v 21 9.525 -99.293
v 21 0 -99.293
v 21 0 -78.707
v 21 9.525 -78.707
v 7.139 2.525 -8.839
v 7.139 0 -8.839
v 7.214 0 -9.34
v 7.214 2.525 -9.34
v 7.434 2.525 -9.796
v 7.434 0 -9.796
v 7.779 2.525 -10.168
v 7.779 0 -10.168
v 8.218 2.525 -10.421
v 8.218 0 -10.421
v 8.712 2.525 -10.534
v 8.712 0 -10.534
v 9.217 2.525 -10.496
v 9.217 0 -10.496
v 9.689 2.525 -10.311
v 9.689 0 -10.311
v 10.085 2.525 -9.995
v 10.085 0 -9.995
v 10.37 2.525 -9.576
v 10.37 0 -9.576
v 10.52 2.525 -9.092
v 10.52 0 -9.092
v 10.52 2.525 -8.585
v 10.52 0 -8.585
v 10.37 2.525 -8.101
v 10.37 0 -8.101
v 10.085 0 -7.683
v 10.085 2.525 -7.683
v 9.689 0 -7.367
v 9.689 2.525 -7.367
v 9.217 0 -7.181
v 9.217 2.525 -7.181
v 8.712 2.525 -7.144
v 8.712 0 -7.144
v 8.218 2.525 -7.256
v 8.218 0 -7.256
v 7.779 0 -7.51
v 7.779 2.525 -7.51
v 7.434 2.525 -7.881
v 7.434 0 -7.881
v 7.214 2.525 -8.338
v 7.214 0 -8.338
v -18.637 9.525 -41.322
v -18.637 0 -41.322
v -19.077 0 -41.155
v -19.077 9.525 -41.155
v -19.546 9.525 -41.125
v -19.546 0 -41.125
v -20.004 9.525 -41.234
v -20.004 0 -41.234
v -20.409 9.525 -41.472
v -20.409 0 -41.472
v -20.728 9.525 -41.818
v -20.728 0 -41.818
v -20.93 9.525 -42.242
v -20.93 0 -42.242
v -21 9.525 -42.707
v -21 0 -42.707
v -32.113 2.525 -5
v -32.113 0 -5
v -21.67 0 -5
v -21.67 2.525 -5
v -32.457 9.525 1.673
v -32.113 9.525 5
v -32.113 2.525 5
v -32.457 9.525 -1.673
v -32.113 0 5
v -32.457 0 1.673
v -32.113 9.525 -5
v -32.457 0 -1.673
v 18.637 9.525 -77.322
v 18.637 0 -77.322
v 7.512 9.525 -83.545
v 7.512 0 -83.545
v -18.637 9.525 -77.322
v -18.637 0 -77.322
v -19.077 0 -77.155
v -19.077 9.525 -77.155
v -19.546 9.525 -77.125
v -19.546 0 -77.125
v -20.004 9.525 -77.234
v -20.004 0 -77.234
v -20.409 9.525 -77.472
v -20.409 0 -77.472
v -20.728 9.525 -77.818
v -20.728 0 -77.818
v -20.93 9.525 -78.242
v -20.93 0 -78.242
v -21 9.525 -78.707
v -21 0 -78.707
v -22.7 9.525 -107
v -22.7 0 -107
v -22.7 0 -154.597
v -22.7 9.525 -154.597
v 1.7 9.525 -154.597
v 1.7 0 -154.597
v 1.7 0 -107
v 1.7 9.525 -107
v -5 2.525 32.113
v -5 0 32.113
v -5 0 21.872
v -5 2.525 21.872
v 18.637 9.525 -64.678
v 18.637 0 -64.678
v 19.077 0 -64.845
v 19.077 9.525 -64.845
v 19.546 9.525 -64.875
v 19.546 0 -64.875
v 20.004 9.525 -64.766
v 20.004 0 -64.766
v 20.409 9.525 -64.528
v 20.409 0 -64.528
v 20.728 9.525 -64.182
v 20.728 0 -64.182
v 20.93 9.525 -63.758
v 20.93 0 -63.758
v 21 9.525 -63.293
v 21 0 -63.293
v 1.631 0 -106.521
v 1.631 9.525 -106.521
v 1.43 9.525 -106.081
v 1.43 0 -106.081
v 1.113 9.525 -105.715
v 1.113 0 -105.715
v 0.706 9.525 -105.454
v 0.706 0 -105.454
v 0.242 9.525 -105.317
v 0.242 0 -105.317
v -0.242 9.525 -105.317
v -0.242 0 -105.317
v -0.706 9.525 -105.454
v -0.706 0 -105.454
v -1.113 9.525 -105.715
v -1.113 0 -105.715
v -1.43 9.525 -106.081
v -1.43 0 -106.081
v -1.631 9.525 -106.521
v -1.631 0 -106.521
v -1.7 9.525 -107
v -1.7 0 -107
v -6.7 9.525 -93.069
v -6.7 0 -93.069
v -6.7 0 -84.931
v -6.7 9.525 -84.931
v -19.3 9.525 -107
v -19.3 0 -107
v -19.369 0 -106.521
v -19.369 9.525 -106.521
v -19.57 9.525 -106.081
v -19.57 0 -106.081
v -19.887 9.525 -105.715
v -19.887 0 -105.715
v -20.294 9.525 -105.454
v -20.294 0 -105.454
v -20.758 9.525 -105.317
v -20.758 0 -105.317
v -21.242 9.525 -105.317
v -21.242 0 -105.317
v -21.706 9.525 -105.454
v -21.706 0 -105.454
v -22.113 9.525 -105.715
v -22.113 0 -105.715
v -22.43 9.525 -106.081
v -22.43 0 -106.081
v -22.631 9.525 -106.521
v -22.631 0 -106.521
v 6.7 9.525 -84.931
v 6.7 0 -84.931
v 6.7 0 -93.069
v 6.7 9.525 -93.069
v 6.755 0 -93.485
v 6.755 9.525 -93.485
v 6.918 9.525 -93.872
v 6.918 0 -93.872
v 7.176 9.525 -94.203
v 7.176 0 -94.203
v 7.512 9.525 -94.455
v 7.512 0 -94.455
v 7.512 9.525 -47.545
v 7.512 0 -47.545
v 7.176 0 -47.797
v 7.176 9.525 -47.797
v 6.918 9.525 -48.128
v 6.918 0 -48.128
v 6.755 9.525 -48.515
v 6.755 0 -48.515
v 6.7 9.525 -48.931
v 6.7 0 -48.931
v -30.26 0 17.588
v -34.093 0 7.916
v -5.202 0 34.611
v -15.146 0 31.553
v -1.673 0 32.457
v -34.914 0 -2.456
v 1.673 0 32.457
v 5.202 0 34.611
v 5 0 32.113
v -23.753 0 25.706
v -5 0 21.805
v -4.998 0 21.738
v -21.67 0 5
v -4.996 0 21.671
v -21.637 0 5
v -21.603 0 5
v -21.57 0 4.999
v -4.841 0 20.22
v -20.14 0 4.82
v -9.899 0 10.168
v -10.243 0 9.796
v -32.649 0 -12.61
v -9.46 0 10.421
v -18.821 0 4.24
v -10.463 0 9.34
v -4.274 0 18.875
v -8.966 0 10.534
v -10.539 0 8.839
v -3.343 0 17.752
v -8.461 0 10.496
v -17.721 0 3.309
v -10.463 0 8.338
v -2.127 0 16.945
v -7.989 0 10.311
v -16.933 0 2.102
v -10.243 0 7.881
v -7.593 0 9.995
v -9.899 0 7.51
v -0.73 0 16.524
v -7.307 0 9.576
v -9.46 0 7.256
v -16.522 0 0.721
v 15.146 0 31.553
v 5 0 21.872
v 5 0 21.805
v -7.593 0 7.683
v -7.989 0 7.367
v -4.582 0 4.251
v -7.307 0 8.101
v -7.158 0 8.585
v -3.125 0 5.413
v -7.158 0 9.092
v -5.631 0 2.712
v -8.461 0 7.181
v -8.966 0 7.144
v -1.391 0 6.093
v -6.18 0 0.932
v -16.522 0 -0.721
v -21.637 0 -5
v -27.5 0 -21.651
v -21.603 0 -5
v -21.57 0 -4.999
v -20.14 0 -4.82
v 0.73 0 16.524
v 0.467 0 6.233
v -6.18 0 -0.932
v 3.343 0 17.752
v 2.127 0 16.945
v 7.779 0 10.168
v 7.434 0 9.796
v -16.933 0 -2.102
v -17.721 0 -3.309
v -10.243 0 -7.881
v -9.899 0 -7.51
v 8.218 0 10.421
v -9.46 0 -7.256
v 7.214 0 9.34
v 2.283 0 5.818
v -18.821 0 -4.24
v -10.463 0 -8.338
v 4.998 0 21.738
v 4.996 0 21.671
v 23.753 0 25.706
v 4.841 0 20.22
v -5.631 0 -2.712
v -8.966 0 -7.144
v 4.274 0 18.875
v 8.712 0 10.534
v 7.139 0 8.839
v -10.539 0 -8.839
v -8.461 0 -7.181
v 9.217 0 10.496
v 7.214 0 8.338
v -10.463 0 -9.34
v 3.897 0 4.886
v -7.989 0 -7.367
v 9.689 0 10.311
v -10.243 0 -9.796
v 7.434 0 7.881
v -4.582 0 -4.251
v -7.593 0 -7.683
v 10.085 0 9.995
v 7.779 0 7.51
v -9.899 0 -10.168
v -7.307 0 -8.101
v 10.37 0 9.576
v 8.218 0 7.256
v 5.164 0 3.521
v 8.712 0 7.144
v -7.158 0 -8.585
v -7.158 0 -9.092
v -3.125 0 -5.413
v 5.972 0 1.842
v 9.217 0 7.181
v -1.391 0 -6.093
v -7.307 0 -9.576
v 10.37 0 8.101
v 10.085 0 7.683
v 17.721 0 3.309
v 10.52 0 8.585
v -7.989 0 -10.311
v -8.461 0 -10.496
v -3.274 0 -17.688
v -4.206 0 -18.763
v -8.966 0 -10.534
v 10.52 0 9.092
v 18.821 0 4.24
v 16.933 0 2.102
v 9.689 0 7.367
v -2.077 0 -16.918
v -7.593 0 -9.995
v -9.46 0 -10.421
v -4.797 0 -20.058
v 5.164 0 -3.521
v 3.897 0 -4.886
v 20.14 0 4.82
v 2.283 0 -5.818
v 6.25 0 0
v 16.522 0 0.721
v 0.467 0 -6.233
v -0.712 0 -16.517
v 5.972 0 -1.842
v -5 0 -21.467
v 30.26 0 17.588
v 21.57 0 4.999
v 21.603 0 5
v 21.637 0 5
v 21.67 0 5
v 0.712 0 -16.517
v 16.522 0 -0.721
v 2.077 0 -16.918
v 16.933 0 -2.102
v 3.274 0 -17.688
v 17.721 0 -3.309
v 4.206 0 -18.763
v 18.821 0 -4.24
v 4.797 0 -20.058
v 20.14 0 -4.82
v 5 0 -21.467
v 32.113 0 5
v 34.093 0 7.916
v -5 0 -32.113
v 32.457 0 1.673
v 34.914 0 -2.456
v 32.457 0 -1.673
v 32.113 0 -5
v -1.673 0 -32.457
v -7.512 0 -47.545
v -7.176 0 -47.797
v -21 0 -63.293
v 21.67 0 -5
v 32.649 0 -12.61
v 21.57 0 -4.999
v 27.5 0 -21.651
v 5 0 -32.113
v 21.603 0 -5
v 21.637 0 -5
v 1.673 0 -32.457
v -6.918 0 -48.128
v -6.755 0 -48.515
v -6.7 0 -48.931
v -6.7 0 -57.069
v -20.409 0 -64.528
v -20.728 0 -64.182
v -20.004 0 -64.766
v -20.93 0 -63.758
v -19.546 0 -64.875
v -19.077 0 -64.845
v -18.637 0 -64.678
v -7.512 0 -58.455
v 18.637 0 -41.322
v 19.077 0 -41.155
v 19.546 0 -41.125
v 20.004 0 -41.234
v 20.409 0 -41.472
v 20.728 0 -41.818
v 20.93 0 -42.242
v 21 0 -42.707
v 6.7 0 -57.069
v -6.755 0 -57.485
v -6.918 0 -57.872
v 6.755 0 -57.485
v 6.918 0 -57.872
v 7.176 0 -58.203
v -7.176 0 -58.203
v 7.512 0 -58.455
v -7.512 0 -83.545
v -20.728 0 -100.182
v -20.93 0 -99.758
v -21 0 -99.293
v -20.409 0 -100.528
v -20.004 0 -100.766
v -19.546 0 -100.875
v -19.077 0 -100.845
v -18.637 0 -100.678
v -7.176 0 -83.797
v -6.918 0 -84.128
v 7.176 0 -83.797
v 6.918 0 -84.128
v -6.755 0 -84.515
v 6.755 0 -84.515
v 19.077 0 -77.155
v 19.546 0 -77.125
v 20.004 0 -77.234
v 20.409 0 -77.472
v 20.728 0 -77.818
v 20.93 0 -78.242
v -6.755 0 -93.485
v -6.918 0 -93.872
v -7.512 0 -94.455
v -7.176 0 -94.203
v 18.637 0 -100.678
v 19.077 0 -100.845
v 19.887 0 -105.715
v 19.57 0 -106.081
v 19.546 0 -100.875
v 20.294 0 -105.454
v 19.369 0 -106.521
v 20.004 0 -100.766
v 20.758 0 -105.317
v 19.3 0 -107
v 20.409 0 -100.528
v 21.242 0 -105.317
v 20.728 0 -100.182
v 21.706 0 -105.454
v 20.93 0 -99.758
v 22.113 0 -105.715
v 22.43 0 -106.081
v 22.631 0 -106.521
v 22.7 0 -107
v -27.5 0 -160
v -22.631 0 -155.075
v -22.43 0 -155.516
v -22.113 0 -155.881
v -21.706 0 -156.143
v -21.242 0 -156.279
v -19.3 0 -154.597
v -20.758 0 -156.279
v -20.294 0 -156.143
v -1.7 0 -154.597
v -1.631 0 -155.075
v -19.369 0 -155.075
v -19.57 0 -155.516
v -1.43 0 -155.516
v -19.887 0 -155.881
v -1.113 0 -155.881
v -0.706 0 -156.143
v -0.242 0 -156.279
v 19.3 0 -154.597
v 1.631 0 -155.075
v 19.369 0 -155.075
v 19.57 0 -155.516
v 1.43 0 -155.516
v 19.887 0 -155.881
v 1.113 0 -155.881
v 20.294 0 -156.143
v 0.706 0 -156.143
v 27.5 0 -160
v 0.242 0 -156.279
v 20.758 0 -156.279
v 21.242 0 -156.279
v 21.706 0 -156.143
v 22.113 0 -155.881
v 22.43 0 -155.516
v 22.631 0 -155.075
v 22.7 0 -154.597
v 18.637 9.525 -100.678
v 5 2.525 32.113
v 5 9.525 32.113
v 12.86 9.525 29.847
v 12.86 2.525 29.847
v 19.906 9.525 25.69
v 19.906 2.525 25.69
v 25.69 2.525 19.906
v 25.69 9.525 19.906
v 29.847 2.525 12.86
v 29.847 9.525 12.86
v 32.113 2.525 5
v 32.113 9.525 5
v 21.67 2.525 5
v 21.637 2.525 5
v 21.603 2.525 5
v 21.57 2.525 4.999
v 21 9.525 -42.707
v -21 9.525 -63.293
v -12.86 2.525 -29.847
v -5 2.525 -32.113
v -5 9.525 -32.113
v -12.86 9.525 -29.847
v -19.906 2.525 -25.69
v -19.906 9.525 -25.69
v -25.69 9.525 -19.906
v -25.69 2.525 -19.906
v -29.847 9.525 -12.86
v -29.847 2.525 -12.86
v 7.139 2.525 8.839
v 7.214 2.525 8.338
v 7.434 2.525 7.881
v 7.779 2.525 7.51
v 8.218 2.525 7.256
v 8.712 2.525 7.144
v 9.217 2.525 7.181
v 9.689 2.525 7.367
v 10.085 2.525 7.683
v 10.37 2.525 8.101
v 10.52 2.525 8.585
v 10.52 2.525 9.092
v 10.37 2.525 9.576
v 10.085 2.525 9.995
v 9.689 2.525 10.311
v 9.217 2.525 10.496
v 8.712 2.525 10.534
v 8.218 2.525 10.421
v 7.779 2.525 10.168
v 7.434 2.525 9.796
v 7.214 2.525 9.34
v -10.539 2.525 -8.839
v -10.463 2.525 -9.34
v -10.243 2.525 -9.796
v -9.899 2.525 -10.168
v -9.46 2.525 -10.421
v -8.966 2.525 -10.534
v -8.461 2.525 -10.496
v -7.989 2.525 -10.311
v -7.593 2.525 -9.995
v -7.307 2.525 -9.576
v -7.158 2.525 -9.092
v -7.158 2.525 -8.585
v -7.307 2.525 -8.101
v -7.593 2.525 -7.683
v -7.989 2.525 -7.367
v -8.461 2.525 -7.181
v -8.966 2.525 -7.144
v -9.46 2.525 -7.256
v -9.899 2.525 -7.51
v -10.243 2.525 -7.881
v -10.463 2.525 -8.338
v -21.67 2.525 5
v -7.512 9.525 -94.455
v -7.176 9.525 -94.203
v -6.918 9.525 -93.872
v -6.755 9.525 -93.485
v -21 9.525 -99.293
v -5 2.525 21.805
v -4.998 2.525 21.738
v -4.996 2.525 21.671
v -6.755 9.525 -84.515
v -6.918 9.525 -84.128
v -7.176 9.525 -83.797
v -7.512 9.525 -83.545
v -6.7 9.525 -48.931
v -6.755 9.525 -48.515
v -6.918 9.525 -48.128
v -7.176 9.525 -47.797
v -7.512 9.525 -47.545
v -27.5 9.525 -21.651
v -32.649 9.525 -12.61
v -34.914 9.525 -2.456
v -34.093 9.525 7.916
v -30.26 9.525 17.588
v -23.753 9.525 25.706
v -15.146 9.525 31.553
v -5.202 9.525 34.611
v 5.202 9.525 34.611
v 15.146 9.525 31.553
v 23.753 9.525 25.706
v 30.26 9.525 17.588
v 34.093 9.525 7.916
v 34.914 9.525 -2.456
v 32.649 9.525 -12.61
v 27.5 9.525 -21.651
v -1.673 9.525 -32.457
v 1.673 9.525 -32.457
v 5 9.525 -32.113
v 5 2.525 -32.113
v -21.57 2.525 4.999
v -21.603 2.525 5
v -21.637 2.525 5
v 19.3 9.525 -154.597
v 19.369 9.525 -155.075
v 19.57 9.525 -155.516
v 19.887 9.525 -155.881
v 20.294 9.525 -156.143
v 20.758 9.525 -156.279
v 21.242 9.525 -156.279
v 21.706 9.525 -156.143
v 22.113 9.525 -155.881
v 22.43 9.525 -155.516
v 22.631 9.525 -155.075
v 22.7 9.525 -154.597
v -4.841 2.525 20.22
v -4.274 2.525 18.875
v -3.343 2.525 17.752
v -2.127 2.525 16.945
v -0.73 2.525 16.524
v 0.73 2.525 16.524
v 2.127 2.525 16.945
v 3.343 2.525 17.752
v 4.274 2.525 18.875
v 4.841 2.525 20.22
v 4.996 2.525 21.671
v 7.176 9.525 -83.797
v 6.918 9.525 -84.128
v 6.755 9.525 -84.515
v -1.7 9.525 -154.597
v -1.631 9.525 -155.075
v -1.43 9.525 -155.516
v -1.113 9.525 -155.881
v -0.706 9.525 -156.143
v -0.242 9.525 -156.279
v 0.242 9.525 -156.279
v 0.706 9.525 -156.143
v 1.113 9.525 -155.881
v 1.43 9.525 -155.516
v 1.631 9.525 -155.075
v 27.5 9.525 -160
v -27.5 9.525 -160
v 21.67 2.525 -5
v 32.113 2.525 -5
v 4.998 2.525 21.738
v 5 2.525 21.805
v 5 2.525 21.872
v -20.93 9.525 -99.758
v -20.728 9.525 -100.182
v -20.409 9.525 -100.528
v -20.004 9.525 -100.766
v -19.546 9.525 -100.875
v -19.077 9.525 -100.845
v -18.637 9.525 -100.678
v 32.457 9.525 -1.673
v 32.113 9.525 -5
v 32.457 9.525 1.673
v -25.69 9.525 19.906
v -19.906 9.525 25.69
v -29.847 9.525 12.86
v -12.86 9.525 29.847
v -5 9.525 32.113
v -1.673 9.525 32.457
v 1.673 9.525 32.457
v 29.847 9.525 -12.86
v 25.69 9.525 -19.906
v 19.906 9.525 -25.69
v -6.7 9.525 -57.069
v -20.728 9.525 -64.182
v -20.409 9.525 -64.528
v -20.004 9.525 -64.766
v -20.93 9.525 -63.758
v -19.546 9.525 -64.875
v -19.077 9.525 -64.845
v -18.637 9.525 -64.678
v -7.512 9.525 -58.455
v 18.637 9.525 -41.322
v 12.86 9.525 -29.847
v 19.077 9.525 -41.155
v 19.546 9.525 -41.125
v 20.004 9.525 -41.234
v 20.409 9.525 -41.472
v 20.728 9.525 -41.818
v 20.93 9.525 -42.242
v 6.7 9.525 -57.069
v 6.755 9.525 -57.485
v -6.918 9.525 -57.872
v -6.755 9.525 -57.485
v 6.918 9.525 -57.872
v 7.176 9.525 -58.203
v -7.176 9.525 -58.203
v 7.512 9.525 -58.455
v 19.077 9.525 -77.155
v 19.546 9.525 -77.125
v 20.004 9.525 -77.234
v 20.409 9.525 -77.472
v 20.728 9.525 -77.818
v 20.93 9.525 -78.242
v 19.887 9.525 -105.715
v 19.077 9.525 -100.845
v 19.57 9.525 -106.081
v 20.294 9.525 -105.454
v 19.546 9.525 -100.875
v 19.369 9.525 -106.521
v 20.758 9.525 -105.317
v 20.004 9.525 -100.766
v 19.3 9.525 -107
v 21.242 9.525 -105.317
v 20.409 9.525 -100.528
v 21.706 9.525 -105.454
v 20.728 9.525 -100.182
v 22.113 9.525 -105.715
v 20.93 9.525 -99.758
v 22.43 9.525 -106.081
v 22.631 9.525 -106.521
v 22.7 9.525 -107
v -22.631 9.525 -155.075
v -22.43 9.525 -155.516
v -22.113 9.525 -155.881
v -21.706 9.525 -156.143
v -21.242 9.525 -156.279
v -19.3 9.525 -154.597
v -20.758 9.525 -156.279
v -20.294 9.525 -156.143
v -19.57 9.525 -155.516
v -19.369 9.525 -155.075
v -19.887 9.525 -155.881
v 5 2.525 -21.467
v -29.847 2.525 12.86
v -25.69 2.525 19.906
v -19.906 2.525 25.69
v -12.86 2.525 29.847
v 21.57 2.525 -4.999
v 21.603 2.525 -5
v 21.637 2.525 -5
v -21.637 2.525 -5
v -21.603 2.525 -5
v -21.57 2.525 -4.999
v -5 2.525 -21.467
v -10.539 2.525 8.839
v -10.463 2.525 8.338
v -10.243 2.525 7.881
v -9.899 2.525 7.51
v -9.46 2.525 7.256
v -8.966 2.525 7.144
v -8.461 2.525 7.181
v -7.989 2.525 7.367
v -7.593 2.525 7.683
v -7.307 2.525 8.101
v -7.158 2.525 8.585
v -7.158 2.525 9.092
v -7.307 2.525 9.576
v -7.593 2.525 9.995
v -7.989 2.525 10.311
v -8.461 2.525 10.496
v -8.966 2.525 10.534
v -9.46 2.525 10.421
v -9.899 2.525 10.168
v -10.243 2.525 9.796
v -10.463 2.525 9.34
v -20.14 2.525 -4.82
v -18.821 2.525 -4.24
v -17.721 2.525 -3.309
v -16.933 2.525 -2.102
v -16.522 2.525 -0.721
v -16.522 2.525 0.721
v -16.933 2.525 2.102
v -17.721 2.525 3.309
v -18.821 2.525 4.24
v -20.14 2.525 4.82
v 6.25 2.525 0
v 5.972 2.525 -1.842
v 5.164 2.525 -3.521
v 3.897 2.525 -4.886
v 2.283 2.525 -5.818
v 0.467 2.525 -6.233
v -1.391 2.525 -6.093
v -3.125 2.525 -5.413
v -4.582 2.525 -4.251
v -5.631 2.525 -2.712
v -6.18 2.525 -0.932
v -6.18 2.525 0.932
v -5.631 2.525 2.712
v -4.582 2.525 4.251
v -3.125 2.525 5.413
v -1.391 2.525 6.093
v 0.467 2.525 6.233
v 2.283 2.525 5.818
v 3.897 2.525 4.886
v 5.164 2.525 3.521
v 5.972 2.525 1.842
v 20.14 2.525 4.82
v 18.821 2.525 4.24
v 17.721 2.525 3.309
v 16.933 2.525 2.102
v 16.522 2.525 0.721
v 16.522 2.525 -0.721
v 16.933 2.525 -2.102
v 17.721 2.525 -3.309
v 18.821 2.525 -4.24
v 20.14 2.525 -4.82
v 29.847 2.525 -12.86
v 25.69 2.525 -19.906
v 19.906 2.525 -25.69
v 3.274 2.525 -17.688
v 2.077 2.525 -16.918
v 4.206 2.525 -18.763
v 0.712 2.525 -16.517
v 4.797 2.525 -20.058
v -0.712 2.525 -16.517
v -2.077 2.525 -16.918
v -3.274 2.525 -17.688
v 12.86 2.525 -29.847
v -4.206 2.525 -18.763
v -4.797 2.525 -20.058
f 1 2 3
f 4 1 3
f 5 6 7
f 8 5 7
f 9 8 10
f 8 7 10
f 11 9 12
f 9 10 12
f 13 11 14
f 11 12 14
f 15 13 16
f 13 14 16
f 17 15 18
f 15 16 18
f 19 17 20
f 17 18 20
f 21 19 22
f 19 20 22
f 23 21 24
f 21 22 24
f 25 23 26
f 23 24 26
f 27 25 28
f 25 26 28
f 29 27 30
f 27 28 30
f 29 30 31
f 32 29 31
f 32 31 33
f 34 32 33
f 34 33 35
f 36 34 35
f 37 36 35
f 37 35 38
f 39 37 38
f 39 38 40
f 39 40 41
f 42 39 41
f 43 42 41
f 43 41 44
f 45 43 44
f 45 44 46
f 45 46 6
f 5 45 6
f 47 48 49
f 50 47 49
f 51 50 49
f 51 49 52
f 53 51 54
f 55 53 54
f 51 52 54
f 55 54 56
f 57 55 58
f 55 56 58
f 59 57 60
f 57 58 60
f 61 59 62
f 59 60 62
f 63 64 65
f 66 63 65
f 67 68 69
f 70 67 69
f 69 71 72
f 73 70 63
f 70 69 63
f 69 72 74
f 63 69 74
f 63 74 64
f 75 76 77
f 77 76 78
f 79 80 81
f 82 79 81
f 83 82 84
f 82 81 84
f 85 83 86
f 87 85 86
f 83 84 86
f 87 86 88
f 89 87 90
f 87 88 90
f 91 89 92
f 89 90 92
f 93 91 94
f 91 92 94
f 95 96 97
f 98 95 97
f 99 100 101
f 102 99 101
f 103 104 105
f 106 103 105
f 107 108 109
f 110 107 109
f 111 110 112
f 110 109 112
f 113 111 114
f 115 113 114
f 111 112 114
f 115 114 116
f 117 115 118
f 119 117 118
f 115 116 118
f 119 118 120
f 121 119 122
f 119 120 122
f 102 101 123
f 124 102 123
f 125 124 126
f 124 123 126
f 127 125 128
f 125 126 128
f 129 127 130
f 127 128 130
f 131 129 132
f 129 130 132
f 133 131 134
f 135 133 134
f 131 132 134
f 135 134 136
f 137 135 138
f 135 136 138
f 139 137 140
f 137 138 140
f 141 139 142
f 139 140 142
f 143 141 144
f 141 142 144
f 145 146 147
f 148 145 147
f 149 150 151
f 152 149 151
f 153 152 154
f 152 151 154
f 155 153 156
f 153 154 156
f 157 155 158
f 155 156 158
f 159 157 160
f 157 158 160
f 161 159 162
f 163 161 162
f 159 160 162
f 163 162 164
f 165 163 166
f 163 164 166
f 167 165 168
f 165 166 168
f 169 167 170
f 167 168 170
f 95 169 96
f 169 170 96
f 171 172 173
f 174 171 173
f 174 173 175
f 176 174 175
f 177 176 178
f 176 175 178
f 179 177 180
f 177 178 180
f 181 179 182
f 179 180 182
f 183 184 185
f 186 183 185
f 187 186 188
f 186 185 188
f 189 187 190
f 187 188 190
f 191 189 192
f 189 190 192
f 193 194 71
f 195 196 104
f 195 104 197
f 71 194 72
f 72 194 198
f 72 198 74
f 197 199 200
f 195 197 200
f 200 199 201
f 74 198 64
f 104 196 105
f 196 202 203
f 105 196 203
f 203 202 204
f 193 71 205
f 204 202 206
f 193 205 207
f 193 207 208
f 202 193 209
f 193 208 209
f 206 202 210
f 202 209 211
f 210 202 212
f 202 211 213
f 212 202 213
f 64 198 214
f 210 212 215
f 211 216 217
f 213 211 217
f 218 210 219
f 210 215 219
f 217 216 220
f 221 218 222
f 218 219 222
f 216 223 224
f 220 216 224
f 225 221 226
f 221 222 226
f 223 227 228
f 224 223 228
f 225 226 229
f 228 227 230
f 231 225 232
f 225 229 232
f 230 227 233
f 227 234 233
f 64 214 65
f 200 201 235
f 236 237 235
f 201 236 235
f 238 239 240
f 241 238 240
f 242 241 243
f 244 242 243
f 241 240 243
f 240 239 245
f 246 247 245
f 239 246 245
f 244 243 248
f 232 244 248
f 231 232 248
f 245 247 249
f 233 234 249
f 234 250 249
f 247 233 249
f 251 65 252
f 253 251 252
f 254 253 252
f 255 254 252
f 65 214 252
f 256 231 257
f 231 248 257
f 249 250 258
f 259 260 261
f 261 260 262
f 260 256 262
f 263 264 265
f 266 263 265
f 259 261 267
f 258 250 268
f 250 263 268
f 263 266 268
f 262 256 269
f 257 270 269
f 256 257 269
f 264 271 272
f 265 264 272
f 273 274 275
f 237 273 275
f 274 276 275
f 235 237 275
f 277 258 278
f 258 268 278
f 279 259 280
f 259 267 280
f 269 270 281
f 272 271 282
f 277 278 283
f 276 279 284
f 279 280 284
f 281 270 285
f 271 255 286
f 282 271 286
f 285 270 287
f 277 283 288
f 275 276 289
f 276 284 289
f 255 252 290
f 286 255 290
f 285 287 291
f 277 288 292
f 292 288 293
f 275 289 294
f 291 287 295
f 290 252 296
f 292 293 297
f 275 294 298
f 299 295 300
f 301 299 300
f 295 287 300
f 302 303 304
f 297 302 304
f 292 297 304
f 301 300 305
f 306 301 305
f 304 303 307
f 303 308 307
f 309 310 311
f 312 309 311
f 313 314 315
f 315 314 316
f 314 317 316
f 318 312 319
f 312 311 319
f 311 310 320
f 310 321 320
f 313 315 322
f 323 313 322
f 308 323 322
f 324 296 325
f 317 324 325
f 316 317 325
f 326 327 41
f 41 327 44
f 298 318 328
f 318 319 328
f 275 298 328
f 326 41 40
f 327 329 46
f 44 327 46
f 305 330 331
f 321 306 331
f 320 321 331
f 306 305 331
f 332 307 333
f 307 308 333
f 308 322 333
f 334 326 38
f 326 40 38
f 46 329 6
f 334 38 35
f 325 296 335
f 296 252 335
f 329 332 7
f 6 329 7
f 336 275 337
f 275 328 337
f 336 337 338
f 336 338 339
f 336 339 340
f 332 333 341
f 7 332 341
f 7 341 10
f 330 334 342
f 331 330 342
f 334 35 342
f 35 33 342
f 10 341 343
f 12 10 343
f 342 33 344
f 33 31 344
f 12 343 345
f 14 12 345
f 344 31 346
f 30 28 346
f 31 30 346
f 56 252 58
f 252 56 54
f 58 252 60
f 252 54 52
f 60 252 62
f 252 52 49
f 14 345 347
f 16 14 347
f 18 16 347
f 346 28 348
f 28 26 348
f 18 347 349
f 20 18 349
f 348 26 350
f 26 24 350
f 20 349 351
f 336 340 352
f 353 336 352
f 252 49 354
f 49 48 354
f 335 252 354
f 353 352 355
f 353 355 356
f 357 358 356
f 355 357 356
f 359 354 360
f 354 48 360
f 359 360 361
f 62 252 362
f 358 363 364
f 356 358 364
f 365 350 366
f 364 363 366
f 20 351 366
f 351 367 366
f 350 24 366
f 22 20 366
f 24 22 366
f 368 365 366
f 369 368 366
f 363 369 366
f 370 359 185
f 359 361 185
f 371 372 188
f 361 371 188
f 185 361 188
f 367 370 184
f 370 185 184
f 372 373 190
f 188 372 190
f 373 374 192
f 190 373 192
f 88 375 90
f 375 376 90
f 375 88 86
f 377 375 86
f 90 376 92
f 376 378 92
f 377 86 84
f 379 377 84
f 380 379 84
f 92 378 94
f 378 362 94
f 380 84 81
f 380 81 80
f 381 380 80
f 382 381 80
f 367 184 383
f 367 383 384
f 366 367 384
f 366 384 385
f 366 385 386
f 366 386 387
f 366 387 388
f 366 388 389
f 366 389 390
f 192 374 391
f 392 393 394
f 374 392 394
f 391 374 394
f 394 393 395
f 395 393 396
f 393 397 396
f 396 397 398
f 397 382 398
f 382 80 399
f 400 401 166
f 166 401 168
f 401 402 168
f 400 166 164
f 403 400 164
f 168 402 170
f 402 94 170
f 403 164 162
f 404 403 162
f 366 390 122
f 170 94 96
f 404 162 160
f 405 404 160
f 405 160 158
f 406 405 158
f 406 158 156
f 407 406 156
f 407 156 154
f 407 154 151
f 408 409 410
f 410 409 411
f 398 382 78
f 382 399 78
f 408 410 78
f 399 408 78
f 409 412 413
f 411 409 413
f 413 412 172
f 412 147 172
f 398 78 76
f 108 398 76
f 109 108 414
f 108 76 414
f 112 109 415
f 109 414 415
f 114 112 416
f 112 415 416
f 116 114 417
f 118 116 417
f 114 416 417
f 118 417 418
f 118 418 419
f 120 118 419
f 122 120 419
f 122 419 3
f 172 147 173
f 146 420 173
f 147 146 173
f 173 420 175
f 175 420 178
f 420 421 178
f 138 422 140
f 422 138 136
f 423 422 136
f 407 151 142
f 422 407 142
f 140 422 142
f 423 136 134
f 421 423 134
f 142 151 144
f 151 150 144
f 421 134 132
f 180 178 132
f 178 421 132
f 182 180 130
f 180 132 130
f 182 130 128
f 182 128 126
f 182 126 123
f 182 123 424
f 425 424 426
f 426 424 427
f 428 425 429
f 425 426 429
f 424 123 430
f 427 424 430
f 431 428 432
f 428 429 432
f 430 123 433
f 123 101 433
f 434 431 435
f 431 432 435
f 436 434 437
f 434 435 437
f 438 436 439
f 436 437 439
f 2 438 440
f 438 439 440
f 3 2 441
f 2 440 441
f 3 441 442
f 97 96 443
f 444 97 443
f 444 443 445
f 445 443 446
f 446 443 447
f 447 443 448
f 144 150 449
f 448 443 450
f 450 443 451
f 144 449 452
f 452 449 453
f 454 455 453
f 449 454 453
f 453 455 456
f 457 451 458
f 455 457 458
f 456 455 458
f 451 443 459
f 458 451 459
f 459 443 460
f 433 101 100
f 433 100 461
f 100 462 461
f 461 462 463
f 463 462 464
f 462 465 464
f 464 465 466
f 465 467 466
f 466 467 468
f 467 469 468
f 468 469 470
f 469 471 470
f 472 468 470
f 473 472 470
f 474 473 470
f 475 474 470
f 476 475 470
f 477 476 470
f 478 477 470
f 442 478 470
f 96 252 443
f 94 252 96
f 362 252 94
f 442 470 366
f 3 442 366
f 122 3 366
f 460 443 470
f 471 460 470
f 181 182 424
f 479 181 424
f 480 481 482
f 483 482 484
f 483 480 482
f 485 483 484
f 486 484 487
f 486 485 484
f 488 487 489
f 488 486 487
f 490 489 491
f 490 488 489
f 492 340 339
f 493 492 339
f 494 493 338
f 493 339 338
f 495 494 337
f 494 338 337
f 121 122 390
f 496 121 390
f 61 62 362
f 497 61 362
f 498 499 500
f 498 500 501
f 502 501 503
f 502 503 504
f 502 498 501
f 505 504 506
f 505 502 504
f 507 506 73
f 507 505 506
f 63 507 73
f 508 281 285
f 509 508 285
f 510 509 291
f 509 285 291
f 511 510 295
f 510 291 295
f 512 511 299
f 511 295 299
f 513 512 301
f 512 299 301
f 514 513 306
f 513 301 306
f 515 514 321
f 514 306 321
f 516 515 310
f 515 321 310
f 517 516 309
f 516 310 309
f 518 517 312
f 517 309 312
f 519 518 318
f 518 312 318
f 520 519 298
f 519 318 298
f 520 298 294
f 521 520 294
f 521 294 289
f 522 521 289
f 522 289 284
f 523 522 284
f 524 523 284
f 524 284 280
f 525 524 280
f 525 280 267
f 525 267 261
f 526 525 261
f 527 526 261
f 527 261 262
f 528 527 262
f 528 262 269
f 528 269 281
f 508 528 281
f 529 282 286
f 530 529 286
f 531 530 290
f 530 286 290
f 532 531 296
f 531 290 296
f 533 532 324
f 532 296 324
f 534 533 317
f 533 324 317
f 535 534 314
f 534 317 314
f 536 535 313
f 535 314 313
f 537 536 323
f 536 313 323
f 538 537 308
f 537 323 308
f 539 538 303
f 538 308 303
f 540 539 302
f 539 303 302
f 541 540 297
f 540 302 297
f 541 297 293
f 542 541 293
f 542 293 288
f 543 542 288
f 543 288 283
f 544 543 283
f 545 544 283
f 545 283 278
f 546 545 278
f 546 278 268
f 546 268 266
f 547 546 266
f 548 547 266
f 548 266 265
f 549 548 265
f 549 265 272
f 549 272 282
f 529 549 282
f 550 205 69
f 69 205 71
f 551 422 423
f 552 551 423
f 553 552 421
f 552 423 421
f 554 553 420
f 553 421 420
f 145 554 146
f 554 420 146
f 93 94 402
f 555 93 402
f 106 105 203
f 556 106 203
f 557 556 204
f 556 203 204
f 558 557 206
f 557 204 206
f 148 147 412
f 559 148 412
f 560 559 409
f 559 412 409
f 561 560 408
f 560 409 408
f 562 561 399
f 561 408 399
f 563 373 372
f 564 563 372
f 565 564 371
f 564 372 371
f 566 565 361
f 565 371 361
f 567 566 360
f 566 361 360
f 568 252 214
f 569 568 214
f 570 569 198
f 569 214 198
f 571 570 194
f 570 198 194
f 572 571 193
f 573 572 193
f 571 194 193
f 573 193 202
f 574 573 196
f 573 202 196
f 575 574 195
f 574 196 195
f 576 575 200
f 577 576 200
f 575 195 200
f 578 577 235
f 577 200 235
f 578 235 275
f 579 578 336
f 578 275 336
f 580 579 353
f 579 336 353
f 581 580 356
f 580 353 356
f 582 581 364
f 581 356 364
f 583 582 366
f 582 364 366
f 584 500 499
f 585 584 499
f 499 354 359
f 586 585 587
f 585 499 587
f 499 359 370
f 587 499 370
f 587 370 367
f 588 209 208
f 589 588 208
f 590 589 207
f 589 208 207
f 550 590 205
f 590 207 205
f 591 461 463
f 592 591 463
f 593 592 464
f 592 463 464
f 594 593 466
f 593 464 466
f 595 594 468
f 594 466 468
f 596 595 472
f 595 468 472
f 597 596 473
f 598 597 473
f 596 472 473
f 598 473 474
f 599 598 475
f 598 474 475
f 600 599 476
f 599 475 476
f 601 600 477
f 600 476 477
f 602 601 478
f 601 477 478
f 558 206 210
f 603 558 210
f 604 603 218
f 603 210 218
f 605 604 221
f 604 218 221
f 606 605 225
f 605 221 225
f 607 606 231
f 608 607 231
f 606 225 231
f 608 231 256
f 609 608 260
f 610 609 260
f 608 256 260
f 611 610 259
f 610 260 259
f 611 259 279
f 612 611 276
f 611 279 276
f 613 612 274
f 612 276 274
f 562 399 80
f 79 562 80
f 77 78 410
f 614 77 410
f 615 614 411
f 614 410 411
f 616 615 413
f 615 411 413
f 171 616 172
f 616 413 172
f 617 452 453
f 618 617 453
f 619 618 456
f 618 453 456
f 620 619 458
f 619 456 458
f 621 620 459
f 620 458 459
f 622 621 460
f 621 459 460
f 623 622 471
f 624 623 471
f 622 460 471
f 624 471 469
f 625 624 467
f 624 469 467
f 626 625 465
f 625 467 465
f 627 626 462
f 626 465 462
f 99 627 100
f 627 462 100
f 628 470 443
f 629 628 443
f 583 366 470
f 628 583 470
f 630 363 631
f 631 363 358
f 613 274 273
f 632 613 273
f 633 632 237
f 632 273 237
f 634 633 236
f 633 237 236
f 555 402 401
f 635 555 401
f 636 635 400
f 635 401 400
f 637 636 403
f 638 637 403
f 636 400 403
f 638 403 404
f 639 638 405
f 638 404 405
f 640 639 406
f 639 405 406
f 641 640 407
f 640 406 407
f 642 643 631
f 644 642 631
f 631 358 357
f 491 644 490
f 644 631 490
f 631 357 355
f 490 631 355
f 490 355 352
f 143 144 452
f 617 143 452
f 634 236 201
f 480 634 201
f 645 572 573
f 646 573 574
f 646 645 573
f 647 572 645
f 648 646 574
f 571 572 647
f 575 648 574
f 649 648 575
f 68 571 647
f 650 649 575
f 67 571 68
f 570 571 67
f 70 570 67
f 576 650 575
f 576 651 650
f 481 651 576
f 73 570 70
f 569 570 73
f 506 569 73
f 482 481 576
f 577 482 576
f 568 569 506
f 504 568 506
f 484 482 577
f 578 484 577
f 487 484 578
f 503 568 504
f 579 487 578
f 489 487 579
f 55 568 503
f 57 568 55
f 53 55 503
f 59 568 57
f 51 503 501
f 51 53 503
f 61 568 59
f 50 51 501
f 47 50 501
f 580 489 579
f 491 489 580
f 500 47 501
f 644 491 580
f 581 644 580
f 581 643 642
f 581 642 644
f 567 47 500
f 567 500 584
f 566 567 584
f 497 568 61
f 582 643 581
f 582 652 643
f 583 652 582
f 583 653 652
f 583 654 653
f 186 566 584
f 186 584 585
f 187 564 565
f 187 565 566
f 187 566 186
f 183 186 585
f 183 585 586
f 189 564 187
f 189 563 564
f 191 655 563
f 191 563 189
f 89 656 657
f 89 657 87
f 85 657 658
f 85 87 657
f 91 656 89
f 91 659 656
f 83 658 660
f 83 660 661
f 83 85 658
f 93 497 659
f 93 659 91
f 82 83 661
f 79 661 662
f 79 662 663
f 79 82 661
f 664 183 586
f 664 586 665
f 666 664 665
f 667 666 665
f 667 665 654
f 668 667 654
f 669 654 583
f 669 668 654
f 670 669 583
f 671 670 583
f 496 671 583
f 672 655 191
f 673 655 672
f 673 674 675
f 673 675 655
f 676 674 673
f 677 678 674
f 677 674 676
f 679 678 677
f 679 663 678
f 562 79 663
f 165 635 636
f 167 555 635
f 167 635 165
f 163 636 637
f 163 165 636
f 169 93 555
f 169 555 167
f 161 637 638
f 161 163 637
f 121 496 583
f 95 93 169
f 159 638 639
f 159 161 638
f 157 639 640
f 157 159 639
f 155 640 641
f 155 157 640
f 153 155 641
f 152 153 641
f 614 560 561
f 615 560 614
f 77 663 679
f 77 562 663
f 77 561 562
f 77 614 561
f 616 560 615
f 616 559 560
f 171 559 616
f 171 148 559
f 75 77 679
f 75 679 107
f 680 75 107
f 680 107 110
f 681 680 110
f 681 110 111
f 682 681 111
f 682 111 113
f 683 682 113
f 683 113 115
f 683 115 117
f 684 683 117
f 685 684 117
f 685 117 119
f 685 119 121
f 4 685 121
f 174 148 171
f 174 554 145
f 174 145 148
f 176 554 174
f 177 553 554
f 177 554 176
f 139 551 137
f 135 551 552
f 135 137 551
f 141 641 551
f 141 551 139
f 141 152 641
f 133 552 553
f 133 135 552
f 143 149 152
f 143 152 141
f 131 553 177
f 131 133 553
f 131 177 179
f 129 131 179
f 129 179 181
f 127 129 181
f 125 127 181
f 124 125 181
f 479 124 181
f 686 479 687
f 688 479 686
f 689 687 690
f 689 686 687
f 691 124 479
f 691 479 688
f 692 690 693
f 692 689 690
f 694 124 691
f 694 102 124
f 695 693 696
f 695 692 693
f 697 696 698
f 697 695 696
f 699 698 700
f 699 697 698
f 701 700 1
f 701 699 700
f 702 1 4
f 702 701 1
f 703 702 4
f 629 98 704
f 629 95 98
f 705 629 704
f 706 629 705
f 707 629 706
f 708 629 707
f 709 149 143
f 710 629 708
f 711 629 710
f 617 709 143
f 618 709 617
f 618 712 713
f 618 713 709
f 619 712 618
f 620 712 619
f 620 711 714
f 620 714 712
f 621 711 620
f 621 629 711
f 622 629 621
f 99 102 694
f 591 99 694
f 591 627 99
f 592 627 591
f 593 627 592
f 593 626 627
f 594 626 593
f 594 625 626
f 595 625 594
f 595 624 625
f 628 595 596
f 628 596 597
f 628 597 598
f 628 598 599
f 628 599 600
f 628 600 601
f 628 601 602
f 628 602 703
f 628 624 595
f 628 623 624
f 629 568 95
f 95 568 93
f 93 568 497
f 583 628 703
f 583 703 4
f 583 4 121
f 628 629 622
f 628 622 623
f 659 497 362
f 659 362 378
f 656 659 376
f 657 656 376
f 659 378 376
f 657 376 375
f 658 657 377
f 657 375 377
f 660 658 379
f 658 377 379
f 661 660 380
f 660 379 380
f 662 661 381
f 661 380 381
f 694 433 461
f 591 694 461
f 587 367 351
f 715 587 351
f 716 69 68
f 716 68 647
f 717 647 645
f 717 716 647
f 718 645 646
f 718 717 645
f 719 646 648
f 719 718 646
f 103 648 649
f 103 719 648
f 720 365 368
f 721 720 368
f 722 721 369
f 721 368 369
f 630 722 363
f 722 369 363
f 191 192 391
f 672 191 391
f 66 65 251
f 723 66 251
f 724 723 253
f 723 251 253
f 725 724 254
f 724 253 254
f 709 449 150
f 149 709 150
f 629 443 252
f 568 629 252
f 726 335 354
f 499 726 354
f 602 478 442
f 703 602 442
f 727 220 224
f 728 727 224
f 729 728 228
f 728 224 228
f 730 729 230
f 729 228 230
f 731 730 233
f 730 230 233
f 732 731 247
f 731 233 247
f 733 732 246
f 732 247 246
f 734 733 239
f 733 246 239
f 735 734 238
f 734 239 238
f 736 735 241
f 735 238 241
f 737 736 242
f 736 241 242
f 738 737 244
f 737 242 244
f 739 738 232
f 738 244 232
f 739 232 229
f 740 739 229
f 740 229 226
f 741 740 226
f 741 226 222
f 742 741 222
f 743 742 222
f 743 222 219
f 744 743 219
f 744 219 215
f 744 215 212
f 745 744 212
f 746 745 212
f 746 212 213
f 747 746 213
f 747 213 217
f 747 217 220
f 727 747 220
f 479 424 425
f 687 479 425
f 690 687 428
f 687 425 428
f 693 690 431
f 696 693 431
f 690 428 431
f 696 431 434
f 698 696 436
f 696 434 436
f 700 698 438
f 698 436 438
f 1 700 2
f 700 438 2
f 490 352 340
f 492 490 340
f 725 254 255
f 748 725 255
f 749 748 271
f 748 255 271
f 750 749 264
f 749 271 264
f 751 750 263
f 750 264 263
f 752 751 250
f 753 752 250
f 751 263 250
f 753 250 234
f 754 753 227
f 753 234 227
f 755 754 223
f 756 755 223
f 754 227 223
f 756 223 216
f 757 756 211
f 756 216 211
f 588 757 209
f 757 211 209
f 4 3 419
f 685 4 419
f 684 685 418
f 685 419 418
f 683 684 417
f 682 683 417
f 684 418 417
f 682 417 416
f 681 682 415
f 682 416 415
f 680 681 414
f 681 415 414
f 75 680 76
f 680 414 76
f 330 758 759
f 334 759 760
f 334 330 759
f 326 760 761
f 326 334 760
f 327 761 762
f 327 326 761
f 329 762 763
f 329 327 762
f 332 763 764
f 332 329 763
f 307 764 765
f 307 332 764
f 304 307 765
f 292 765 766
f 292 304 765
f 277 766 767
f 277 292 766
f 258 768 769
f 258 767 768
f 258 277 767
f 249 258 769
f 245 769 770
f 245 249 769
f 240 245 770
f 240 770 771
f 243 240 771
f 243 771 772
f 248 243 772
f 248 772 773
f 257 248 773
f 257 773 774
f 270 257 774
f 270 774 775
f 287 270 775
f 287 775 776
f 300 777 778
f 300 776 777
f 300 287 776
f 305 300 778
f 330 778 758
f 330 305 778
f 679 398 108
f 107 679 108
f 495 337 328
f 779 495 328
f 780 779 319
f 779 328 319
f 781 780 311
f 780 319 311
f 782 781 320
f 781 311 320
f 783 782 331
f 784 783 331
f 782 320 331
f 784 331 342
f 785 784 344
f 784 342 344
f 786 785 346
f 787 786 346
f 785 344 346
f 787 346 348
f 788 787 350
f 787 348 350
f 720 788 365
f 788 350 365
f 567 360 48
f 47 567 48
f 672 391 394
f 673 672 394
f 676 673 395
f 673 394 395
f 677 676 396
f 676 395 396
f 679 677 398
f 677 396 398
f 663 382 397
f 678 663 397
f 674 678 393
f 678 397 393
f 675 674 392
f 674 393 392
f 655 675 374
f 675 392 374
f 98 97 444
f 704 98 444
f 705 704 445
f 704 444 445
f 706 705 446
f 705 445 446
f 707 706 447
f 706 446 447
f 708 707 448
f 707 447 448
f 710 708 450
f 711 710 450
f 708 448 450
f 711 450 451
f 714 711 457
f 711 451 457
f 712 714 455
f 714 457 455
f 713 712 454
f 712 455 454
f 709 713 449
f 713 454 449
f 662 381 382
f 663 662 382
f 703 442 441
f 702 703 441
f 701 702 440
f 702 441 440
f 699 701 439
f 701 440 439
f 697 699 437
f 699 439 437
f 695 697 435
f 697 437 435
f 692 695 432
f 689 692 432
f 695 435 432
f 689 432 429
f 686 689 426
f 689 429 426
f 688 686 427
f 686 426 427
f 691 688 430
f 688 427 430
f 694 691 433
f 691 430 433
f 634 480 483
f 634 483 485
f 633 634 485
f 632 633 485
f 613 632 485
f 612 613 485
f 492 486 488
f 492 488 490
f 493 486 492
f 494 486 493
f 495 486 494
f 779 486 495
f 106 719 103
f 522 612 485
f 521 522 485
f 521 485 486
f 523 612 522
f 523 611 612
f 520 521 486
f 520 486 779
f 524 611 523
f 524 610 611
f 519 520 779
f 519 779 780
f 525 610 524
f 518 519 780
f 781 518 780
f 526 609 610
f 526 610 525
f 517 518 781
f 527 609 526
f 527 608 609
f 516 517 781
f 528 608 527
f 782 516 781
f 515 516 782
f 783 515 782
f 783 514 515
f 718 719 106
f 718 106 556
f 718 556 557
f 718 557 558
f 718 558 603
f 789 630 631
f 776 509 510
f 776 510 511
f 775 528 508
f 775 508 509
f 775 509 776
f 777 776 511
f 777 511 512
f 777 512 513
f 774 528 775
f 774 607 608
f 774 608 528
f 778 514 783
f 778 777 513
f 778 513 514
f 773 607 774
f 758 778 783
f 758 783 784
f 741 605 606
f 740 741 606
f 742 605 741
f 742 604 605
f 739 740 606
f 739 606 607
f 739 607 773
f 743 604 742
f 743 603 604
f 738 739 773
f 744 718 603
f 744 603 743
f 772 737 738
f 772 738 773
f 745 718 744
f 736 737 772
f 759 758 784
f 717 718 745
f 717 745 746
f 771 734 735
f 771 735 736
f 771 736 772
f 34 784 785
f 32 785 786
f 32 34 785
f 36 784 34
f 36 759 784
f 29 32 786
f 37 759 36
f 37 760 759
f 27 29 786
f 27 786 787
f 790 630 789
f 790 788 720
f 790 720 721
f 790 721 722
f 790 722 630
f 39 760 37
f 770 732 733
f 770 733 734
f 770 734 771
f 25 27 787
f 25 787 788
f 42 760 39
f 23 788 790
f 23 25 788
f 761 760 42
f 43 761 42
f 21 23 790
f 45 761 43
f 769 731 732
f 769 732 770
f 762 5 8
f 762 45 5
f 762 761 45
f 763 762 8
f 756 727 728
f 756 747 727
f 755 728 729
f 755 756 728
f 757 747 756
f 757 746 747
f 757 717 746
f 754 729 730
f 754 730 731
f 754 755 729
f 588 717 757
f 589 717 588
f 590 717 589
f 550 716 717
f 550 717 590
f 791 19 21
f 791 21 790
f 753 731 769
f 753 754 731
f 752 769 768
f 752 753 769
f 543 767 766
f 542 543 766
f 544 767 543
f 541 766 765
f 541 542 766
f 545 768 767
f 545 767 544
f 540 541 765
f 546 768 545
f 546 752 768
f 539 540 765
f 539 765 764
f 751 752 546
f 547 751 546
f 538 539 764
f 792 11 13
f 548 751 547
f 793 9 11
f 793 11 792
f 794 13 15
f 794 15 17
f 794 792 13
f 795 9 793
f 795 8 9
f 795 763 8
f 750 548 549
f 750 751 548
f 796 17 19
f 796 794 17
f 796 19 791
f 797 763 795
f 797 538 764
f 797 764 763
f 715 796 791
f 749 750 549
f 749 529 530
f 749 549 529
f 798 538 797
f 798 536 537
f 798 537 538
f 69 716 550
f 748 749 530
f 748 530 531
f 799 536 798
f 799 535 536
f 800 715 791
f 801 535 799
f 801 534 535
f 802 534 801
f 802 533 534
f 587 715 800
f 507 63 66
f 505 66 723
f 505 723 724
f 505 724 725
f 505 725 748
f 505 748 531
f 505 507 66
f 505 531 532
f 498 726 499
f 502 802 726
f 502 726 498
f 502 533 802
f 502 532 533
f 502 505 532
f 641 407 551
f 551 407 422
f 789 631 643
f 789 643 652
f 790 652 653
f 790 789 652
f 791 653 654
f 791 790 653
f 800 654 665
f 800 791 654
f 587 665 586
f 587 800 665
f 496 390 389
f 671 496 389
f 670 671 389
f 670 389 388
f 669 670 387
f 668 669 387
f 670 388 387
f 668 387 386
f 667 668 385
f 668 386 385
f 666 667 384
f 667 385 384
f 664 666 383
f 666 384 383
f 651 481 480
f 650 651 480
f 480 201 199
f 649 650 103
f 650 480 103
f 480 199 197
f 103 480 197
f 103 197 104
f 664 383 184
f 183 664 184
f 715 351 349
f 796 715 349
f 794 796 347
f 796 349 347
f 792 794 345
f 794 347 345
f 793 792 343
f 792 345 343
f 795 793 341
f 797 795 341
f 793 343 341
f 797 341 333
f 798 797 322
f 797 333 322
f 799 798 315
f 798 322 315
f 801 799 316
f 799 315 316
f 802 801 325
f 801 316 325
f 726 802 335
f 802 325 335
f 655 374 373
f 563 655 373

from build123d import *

# Parameters (mm, degrees)
BOSS_EXTRUDE1_OUTLINE_R = 6.25
BOSS_EXTRUDE1_DEPTH     = 9.525
CUT_EXTRUDE1_START      = -7
SKETCH3_R               = 32.5
CUT_EXTRUDE1_DEPTH      = 7
M3_CLEARANCE_HOLE1_D    = 3.4


# Read off the part's stored shape, not the designer's step: Boss-Extrude1
with BuildPart() as part:
    # Boss-Extrude1 outline → Boss-Extrude1 (new body)
    with BuildSketch(Plane(origin=(0, 0, 0), x_dir=(1, 0, 0), z_dir=(0, 1, 0))):
        with BuildLine():
            Line((-27.5, 160), (-27.5, 21.650635095))
            ThreePointArc((-27.5, 21.650635095), (0, -35), (27.5, 21.650635095))
            Line((27.5, 21.650635095), (27.5, 160))
            Line((27.5, 160), (-27.5, 160))
        make_face()
        with BuildLine():
            Line((-21.67, -5), (-32.113081447, -5))
            ThreePointArc((-32.113081447, -5), (-32.5, 0), (-32.113081447, 5))
            Line((-32.113081447, 5), (-21.67, 5))
            ThreePointArc((-21.67, 5), (-21.6199975, 4.999749969), (-21.57, 4.9989999))
            ThreePointArc((-21.57, 4.9989999), (-16.47, 0), (-21.57, -4.9989999))
            ThreePointArc((-21.57, -4.9989999), (-21.6199975, -4.999749969), (-21.67, -5))
        make_face(mode=Mode.SUBTRACT)
        with BuildLine():
            Line((-21, 42.707149814), (-21, 63.292850186))
            ThreePointArc((-21, 63.292850186), (-20.2155368, 64.662261792), (-18.637432255, 64.678283779))
            Line((-18.637432255, 64.678283779), (-7.512432255, 58.454507556))
            ThreePointArc((-7.512432255, 58.454507556), (-6.918088394, 57.872110763), (-6.7, 57.069073962))
            Line((-6.7, 57.069073962), (-6.7, 48.930926038))
            ThreePointArc((-6.7, 48.930926038), (-6.918088394, 48.127889237), (-7.512432255, 47.545492444))
            Line((-7.512432255, 47.545492444), (-18.637432255, 41.321716221))
            ThreePointArc((-18.637432255, 41.321716221), (-20.2155368, 41.337738208), (-21, 42.707149814))
        make_face(mode=Mode.SUBTRACT)
        with BuildLine():
            Line((5, -21.872218084), (5, -32.113081447))
            ThreePointArc((5, -32.113081447), (0, -32.5), (-5, -32.113081447))
            Line((-5, -32.113081447), (-5, -21.872218084))
            ThreePointArc((-5, -21.872218084), (-4.998988367, -21.771643214), (-4.995953878, -21.671109042))
            ThreePointArc((-4.995953878, -21.671109042), (0, -16.47), (4.995953878, -21.671109042))
            ThreePointArc((4.995953878, -21.671109042), (4.998988367, -21.771643214), (5, -21.872218084))
        make_face(mode=Mode.SUBTRACT)
        Circle(BOSS_EXTRUDE1_OUTLINE_R, mode=Mode.SUBTRACT)
        with BuildLine():
            Line((21.67, 5), (32.113081447, 5))
            ThreePointArc((32.113081447, 5), (32.5, 0), (32.113081447, -5))
            Line((32.113081447, -5), (21.67, -5))
            ThreePointArc((21.67, -5), (21.6199975, -4.999749969), (21.57, -4.9989999))
            ThreePointArc((21.57, -4.9989999), (16.47, 0), (21.57, 4.9989999))
            ThreePointArc((21.57, 4.9989999), (21.6199975, 4.999749969), (21.67, 5))
        make_face(mode=Mode.SUBTRACT)
        with BuildLine():
            Line((-5, 21.466517846), (-5, 32.113081447))
            ThreePointArc((-5, 32.113081447), (0, 32.5), (5, 32.113081447))
            Line((5, 32.113081447), (5, 21.466517846))
            ThreePointArc((5, 21.466517846), (0, 16.466517846), (-5, 21.466517846))
        make_face(mode=Mode.SUBTRACT)
        with BuildLine():
            ThreePointArc((7.512432255, 47.545492444), (6.918088394, 48.127889237), (6.7, 48.930926038))
            Line((6.7, 48.930926038), (6.7, 57.069073962))
            ThreePointArc((6.7, 57.069073962), (6.918088394, 57.872110763), (7.512432255, 58.454507556))
            Line((7.512432255, 58.454507556), (18.637432255, 64.678283779))
            ThreePointArc((18.637432255, 64.678283779), (20.2155368, 64.662261792), (21, 63.292850186))
            Line((21, 63.292850186), (21, 42.707149814))
            ThreePointArc((21, 42.707149814), (20.2155368, 41.337738208), (18.637432255, 41.321716221))
            Line((18.637432255, 41.321716221), (7.512432255, 47.545492444))
        make_face(mode=Mode.SUBTRACT)
        with BuildLine():
            Line((-21, 78.707149814), (-21, 99.292850186))
            ThreePointArc((-21, 99.292850186), (-20.2155368, 100.662261792), (-18.637432255, 100.678283779))
            Line((-18.637432255, 100.678283779), (-7.512432255, 94.454507556))
            ThreePointArc((-7.512432255, 94.454507556), (-6.918088394, 93.872110763), (-6.7, 93.069073962))
            Line((-6.7, 93.069073962), (-6.7, 84.930926038))
            ThreePointArc((-6.7, 84.930926038), (-6.918088394, 84.127889237), (-7.512432255, 83.545492444))
            Line((-7.512432255, 83.545492444), (-18.637432255, 77.321716221))
            ThreePointArc((-18.637432255, 77.321716221), (-20.2155368, 77.337738208), (-21, 78.707149814))
        make_face(mode=Mode.SUBTRACT)
        with BuildLine():
            Line((-19.3, 154.596553922), (-19.3, 107))
            ThreePointArc((-19.3, 107), (-21, 105.3), (-22.7, 107))
            Line((-22.7, 107), (-22.7, 154.596553922))
            ThreePointArc((-22.7, 154.596553922), (-21, 156.296553922), (-19.3, 154.596553922))
        make_face(mode=Mode.SUBTRACT)
        with BuildLine():
            ThreePointArc((18.637432255, 100.678283779), (20.2155368, 100.662261792), (21, 99.292850186))
            Line((21, 99.292850186), (21, 78.707149814))
            ThreePointArc((21, 78.707149814), (20.2155368, 77.337738208), (18.637432255, 77.321716221))
            Line((18.637432255, 77.321716221), (7.512432255, 83.545492444))
            ThreePointArc((7.512432255, 83.545492444), (6.918088394, 84.127889237), (6.7, 84.930926038))
            Line((6.7, 84.930926038), (6.7, 93.069073962))
            ThreePointArc((6.7, 93.069073962), (6.918088394, 93.872110763), (7.512432255, 94.454507556))
            Line((7.512432255, 94.454507556), (18.637432255, 100.678283779))
        make_face(mode=Mode.SUBTRACT)
        with BuildLine():
            Line((1.7, 154.596553922), (1.7, 107))
            ThreePointArc((1.7, 107), (0, 105.3), (-1.7, 107))
            Line((-1.7, 107), (-1.7, 154.596553922))
            ThreePointArc((-1.7, 154.596553922), (0, 156.296553922), (1.7, 154.596553922))
        make_face(mode=Mode.SUBTRACT)
        with BuildLine():
            Line((22.7, 154.596553922), (22.7, 107))
            ThreePointArc((22.7, 107), (21, 105.3), (19.3, 107))
            Line((19.3, 107), (19.3, 154.596553922))
            ThreePointArc((19.3, 154.596553922), (21, 156.296553922), (22.7, 154.596553922))
        make_face(mode=Mode.SUBTRACT)
    extrude(amount=BOSS_EXTRUDE1_DEPTH)

    # Sketch3 → Cut-Extrude1 (cut)
    with BuildSketch(Plane(origin=(0, 9.525, 0), x_dir=(1, 0, 0), z_dir=(0, 1, 0)).offset(CUT_EXTRUDE1_START)):
        with Locations(Location((0, 0, 0), (0, 0, 81.150116902))):
            Circle(SKETCH3_R)
    extrude(amount=CUT_EXTRUDE1_DEPTH, mode=Mode.SUBTRACT)

    # M3 Clearance Hole1 (through all)
    with Locations(Plane(origin=(0, 2.525, 0), x_dir=(1, 0, 0), z_dir=(0, 1, 0))):
        with Locations((8.838834765, 8.838834765), (-8.838834765, -8.838834765), (-8.838834765, 8.838834765), (8.838834765, -8.838834765)):
            Hole(M3_CLEARANCE_HOLE1_D / 2)


solid = part.part
